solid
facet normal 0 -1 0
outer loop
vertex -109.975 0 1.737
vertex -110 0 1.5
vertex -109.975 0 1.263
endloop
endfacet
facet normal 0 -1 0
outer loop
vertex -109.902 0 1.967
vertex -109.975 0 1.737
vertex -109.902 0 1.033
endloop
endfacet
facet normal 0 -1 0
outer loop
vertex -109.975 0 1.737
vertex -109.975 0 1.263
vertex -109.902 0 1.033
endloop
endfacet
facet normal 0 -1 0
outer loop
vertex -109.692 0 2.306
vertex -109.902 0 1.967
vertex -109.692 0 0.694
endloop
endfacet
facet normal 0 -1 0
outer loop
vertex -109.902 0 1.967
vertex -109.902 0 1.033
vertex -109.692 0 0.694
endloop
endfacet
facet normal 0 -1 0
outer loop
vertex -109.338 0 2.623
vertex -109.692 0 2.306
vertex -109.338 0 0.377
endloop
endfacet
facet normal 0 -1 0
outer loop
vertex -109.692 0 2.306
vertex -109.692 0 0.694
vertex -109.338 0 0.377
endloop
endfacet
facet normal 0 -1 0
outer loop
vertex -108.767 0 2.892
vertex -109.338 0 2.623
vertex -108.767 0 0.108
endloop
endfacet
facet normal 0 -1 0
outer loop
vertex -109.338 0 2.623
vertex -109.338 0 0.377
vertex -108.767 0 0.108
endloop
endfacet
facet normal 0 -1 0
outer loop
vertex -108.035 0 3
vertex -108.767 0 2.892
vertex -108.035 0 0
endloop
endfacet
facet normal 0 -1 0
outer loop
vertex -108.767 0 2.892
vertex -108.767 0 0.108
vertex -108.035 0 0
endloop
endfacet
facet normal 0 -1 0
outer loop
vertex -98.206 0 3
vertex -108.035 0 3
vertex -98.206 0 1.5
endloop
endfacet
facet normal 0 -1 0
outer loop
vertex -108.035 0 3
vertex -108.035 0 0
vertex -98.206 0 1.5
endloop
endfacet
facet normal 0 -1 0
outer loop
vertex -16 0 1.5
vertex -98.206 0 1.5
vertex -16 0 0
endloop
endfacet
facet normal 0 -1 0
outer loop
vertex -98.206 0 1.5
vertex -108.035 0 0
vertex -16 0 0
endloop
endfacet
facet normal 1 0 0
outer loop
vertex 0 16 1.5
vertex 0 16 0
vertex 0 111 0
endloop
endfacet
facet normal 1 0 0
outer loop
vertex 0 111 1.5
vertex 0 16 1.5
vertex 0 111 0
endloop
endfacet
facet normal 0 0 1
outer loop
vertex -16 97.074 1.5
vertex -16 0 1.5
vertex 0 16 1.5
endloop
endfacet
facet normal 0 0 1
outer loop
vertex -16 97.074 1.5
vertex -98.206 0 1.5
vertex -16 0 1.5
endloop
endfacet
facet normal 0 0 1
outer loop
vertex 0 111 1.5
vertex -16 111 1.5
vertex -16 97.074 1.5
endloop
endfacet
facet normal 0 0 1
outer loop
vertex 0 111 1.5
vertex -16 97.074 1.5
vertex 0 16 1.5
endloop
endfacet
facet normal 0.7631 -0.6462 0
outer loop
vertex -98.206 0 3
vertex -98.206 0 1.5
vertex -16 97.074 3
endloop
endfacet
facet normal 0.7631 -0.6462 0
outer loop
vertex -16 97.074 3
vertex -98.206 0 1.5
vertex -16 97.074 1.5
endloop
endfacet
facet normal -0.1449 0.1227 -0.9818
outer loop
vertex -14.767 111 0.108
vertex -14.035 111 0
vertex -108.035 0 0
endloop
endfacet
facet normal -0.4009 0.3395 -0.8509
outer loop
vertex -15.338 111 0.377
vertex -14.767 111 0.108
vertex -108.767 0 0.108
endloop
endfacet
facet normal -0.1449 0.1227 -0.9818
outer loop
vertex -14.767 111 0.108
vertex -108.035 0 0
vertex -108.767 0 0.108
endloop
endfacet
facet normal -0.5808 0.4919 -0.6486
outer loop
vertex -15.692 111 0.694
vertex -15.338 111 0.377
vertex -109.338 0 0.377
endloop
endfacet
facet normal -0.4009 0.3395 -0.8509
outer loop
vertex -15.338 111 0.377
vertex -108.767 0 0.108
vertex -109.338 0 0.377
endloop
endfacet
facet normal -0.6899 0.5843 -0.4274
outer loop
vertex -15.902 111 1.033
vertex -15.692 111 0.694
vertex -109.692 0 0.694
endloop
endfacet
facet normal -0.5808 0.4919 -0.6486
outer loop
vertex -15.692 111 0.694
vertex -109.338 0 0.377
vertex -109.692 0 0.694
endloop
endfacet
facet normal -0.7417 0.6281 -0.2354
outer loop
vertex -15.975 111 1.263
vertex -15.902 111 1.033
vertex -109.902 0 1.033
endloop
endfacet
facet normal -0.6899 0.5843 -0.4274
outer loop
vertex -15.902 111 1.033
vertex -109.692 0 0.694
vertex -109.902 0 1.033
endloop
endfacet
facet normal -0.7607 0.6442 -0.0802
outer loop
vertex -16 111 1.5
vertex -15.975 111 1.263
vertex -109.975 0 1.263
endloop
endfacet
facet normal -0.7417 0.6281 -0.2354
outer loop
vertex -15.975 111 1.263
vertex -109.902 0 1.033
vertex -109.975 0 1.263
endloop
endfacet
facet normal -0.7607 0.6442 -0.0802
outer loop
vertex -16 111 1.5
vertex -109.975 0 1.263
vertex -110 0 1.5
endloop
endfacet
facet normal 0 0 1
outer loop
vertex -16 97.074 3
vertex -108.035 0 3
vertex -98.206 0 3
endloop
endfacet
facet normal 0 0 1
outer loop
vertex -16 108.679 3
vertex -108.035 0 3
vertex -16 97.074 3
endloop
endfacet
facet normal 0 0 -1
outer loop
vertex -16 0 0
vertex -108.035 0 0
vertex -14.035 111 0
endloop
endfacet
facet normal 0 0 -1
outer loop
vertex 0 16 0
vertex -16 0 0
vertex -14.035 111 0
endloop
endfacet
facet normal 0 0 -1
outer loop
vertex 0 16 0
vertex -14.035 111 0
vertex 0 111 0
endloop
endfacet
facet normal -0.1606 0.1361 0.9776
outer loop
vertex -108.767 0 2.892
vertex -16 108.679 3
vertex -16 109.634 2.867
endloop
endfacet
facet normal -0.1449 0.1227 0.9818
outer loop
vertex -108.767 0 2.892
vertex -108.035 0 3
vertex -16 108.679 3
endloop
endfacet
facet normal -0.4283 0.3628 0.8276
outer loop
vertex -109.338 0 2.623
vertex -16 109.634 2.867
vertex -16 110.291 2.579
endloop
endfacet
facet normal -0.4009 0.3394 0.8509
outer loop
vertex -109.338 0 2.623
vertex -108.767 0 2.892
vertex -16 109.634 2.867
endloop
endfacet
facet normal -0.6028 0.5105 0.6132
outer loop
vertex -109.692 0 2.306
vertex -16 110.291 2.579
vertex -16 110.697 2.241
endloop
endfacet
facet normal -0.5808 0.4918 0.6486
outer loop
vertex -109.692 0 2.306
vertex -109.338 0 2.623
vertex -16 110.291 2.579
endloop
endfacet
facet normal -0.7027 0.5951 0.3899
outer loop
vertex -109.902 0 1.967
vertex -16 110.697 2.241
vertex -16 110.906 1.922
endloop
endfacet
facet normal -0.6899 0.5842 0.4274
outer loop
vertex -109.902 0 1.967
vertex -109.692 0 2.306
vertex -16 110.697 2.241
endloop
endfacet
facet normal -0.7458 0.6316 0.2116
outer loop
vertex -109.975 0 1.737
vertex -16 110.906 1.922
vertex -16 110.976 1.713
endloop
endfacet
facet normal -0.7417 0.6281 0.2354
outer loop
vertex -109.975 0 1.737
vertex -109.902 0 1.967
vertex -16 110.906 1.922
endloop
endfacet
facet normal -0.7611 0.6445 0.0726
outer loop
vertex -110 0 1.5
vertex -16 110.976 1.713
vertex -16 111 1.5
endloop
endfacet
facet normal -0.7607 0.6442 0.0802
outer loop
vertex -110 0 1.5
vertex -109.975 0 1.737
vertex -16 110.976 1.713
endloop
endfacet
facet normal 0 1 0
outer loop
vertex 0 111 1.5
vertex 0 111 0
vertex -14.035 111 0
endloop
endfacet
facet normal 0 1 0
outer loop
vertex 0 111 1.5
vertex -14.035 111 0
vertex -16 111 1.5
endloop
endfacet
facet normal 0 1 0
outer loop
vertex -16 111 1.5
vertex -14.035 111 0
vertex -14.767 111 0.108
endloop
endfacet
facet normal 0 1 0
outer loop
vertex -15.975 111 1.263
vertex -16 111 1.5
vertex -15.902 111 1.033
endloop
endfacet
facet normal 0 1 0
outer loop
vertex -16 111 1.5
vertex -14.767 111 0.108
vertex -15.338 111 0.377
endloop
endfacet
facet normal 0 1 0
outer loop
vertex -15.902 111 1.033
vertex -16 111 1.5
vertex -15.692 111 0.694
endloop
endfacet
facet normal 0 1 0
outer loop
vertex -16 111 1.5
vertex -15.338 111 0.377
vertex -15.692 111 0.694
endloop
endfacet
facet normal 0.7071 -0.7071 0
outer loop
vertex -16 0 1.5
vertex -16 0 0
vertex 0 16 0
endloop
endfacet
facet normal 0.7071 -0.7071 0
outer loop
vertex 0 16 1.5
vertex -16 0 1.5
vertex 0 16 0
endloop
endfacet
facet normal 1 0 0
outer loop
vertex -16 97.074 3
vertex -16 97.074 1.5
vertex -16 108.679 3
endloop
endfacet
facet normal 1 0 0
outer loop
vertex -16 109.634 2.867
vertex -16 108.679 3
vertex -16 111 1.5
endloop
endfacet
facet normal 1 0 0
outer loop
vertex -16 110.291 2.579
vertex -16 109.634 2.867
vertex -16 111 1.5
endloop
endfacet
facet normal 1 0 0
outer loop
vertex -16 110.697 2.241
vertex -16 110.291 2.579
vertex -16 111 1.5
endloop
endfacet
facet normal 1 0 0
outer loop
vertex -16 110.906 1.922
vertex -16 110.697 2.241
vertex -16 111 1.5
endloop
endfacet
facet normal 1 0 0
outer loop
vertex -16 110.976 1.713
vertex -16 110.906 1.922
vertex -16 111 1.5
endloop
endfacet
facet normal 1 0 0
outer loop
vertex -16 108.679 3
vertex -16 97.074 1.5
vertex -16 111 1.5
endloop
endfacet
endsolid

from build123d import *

# Parameters (mm, degrees)
EXTRUDE_1_DEPTH = 1.5
EXTRUDE_2_DEPTH = 3
FILLET_1_R      = 1.5


with BuildPart() as part:
    # 草圖1 → 擠出1 (new body)
    with BuildSketch(Plane.XY):
        Polygon((-16, 0), (0, 16), (0, 111), (-16, 111), (-16, 97.073509127), (-98.206395117, 0), align=None)
    extrude(amount=EXTRUDE_1_DEPTH)

    # 草圖2 → 擠出2 (add)
    with BuildSketch(Plane.XY):
        Polygon((-110, 0), (-98.206395117, 0), (-16, 97.073509127), (-16, 111), align=None)
    extrude(amount=EXTRUDE_2_DEPTH)

    # 圓角1
    fillet_1_edges = [part.edges().sort_by_distance(p)[0] for p in [
        (-63, 55.5, 0),
        (-63, 55.5, 3),
    ]]
    fillet(fillet_1_edges, radius=FILLET_1_R - 0.0001)  # a hair under: the kernel refuses the full size


solid = part.part
